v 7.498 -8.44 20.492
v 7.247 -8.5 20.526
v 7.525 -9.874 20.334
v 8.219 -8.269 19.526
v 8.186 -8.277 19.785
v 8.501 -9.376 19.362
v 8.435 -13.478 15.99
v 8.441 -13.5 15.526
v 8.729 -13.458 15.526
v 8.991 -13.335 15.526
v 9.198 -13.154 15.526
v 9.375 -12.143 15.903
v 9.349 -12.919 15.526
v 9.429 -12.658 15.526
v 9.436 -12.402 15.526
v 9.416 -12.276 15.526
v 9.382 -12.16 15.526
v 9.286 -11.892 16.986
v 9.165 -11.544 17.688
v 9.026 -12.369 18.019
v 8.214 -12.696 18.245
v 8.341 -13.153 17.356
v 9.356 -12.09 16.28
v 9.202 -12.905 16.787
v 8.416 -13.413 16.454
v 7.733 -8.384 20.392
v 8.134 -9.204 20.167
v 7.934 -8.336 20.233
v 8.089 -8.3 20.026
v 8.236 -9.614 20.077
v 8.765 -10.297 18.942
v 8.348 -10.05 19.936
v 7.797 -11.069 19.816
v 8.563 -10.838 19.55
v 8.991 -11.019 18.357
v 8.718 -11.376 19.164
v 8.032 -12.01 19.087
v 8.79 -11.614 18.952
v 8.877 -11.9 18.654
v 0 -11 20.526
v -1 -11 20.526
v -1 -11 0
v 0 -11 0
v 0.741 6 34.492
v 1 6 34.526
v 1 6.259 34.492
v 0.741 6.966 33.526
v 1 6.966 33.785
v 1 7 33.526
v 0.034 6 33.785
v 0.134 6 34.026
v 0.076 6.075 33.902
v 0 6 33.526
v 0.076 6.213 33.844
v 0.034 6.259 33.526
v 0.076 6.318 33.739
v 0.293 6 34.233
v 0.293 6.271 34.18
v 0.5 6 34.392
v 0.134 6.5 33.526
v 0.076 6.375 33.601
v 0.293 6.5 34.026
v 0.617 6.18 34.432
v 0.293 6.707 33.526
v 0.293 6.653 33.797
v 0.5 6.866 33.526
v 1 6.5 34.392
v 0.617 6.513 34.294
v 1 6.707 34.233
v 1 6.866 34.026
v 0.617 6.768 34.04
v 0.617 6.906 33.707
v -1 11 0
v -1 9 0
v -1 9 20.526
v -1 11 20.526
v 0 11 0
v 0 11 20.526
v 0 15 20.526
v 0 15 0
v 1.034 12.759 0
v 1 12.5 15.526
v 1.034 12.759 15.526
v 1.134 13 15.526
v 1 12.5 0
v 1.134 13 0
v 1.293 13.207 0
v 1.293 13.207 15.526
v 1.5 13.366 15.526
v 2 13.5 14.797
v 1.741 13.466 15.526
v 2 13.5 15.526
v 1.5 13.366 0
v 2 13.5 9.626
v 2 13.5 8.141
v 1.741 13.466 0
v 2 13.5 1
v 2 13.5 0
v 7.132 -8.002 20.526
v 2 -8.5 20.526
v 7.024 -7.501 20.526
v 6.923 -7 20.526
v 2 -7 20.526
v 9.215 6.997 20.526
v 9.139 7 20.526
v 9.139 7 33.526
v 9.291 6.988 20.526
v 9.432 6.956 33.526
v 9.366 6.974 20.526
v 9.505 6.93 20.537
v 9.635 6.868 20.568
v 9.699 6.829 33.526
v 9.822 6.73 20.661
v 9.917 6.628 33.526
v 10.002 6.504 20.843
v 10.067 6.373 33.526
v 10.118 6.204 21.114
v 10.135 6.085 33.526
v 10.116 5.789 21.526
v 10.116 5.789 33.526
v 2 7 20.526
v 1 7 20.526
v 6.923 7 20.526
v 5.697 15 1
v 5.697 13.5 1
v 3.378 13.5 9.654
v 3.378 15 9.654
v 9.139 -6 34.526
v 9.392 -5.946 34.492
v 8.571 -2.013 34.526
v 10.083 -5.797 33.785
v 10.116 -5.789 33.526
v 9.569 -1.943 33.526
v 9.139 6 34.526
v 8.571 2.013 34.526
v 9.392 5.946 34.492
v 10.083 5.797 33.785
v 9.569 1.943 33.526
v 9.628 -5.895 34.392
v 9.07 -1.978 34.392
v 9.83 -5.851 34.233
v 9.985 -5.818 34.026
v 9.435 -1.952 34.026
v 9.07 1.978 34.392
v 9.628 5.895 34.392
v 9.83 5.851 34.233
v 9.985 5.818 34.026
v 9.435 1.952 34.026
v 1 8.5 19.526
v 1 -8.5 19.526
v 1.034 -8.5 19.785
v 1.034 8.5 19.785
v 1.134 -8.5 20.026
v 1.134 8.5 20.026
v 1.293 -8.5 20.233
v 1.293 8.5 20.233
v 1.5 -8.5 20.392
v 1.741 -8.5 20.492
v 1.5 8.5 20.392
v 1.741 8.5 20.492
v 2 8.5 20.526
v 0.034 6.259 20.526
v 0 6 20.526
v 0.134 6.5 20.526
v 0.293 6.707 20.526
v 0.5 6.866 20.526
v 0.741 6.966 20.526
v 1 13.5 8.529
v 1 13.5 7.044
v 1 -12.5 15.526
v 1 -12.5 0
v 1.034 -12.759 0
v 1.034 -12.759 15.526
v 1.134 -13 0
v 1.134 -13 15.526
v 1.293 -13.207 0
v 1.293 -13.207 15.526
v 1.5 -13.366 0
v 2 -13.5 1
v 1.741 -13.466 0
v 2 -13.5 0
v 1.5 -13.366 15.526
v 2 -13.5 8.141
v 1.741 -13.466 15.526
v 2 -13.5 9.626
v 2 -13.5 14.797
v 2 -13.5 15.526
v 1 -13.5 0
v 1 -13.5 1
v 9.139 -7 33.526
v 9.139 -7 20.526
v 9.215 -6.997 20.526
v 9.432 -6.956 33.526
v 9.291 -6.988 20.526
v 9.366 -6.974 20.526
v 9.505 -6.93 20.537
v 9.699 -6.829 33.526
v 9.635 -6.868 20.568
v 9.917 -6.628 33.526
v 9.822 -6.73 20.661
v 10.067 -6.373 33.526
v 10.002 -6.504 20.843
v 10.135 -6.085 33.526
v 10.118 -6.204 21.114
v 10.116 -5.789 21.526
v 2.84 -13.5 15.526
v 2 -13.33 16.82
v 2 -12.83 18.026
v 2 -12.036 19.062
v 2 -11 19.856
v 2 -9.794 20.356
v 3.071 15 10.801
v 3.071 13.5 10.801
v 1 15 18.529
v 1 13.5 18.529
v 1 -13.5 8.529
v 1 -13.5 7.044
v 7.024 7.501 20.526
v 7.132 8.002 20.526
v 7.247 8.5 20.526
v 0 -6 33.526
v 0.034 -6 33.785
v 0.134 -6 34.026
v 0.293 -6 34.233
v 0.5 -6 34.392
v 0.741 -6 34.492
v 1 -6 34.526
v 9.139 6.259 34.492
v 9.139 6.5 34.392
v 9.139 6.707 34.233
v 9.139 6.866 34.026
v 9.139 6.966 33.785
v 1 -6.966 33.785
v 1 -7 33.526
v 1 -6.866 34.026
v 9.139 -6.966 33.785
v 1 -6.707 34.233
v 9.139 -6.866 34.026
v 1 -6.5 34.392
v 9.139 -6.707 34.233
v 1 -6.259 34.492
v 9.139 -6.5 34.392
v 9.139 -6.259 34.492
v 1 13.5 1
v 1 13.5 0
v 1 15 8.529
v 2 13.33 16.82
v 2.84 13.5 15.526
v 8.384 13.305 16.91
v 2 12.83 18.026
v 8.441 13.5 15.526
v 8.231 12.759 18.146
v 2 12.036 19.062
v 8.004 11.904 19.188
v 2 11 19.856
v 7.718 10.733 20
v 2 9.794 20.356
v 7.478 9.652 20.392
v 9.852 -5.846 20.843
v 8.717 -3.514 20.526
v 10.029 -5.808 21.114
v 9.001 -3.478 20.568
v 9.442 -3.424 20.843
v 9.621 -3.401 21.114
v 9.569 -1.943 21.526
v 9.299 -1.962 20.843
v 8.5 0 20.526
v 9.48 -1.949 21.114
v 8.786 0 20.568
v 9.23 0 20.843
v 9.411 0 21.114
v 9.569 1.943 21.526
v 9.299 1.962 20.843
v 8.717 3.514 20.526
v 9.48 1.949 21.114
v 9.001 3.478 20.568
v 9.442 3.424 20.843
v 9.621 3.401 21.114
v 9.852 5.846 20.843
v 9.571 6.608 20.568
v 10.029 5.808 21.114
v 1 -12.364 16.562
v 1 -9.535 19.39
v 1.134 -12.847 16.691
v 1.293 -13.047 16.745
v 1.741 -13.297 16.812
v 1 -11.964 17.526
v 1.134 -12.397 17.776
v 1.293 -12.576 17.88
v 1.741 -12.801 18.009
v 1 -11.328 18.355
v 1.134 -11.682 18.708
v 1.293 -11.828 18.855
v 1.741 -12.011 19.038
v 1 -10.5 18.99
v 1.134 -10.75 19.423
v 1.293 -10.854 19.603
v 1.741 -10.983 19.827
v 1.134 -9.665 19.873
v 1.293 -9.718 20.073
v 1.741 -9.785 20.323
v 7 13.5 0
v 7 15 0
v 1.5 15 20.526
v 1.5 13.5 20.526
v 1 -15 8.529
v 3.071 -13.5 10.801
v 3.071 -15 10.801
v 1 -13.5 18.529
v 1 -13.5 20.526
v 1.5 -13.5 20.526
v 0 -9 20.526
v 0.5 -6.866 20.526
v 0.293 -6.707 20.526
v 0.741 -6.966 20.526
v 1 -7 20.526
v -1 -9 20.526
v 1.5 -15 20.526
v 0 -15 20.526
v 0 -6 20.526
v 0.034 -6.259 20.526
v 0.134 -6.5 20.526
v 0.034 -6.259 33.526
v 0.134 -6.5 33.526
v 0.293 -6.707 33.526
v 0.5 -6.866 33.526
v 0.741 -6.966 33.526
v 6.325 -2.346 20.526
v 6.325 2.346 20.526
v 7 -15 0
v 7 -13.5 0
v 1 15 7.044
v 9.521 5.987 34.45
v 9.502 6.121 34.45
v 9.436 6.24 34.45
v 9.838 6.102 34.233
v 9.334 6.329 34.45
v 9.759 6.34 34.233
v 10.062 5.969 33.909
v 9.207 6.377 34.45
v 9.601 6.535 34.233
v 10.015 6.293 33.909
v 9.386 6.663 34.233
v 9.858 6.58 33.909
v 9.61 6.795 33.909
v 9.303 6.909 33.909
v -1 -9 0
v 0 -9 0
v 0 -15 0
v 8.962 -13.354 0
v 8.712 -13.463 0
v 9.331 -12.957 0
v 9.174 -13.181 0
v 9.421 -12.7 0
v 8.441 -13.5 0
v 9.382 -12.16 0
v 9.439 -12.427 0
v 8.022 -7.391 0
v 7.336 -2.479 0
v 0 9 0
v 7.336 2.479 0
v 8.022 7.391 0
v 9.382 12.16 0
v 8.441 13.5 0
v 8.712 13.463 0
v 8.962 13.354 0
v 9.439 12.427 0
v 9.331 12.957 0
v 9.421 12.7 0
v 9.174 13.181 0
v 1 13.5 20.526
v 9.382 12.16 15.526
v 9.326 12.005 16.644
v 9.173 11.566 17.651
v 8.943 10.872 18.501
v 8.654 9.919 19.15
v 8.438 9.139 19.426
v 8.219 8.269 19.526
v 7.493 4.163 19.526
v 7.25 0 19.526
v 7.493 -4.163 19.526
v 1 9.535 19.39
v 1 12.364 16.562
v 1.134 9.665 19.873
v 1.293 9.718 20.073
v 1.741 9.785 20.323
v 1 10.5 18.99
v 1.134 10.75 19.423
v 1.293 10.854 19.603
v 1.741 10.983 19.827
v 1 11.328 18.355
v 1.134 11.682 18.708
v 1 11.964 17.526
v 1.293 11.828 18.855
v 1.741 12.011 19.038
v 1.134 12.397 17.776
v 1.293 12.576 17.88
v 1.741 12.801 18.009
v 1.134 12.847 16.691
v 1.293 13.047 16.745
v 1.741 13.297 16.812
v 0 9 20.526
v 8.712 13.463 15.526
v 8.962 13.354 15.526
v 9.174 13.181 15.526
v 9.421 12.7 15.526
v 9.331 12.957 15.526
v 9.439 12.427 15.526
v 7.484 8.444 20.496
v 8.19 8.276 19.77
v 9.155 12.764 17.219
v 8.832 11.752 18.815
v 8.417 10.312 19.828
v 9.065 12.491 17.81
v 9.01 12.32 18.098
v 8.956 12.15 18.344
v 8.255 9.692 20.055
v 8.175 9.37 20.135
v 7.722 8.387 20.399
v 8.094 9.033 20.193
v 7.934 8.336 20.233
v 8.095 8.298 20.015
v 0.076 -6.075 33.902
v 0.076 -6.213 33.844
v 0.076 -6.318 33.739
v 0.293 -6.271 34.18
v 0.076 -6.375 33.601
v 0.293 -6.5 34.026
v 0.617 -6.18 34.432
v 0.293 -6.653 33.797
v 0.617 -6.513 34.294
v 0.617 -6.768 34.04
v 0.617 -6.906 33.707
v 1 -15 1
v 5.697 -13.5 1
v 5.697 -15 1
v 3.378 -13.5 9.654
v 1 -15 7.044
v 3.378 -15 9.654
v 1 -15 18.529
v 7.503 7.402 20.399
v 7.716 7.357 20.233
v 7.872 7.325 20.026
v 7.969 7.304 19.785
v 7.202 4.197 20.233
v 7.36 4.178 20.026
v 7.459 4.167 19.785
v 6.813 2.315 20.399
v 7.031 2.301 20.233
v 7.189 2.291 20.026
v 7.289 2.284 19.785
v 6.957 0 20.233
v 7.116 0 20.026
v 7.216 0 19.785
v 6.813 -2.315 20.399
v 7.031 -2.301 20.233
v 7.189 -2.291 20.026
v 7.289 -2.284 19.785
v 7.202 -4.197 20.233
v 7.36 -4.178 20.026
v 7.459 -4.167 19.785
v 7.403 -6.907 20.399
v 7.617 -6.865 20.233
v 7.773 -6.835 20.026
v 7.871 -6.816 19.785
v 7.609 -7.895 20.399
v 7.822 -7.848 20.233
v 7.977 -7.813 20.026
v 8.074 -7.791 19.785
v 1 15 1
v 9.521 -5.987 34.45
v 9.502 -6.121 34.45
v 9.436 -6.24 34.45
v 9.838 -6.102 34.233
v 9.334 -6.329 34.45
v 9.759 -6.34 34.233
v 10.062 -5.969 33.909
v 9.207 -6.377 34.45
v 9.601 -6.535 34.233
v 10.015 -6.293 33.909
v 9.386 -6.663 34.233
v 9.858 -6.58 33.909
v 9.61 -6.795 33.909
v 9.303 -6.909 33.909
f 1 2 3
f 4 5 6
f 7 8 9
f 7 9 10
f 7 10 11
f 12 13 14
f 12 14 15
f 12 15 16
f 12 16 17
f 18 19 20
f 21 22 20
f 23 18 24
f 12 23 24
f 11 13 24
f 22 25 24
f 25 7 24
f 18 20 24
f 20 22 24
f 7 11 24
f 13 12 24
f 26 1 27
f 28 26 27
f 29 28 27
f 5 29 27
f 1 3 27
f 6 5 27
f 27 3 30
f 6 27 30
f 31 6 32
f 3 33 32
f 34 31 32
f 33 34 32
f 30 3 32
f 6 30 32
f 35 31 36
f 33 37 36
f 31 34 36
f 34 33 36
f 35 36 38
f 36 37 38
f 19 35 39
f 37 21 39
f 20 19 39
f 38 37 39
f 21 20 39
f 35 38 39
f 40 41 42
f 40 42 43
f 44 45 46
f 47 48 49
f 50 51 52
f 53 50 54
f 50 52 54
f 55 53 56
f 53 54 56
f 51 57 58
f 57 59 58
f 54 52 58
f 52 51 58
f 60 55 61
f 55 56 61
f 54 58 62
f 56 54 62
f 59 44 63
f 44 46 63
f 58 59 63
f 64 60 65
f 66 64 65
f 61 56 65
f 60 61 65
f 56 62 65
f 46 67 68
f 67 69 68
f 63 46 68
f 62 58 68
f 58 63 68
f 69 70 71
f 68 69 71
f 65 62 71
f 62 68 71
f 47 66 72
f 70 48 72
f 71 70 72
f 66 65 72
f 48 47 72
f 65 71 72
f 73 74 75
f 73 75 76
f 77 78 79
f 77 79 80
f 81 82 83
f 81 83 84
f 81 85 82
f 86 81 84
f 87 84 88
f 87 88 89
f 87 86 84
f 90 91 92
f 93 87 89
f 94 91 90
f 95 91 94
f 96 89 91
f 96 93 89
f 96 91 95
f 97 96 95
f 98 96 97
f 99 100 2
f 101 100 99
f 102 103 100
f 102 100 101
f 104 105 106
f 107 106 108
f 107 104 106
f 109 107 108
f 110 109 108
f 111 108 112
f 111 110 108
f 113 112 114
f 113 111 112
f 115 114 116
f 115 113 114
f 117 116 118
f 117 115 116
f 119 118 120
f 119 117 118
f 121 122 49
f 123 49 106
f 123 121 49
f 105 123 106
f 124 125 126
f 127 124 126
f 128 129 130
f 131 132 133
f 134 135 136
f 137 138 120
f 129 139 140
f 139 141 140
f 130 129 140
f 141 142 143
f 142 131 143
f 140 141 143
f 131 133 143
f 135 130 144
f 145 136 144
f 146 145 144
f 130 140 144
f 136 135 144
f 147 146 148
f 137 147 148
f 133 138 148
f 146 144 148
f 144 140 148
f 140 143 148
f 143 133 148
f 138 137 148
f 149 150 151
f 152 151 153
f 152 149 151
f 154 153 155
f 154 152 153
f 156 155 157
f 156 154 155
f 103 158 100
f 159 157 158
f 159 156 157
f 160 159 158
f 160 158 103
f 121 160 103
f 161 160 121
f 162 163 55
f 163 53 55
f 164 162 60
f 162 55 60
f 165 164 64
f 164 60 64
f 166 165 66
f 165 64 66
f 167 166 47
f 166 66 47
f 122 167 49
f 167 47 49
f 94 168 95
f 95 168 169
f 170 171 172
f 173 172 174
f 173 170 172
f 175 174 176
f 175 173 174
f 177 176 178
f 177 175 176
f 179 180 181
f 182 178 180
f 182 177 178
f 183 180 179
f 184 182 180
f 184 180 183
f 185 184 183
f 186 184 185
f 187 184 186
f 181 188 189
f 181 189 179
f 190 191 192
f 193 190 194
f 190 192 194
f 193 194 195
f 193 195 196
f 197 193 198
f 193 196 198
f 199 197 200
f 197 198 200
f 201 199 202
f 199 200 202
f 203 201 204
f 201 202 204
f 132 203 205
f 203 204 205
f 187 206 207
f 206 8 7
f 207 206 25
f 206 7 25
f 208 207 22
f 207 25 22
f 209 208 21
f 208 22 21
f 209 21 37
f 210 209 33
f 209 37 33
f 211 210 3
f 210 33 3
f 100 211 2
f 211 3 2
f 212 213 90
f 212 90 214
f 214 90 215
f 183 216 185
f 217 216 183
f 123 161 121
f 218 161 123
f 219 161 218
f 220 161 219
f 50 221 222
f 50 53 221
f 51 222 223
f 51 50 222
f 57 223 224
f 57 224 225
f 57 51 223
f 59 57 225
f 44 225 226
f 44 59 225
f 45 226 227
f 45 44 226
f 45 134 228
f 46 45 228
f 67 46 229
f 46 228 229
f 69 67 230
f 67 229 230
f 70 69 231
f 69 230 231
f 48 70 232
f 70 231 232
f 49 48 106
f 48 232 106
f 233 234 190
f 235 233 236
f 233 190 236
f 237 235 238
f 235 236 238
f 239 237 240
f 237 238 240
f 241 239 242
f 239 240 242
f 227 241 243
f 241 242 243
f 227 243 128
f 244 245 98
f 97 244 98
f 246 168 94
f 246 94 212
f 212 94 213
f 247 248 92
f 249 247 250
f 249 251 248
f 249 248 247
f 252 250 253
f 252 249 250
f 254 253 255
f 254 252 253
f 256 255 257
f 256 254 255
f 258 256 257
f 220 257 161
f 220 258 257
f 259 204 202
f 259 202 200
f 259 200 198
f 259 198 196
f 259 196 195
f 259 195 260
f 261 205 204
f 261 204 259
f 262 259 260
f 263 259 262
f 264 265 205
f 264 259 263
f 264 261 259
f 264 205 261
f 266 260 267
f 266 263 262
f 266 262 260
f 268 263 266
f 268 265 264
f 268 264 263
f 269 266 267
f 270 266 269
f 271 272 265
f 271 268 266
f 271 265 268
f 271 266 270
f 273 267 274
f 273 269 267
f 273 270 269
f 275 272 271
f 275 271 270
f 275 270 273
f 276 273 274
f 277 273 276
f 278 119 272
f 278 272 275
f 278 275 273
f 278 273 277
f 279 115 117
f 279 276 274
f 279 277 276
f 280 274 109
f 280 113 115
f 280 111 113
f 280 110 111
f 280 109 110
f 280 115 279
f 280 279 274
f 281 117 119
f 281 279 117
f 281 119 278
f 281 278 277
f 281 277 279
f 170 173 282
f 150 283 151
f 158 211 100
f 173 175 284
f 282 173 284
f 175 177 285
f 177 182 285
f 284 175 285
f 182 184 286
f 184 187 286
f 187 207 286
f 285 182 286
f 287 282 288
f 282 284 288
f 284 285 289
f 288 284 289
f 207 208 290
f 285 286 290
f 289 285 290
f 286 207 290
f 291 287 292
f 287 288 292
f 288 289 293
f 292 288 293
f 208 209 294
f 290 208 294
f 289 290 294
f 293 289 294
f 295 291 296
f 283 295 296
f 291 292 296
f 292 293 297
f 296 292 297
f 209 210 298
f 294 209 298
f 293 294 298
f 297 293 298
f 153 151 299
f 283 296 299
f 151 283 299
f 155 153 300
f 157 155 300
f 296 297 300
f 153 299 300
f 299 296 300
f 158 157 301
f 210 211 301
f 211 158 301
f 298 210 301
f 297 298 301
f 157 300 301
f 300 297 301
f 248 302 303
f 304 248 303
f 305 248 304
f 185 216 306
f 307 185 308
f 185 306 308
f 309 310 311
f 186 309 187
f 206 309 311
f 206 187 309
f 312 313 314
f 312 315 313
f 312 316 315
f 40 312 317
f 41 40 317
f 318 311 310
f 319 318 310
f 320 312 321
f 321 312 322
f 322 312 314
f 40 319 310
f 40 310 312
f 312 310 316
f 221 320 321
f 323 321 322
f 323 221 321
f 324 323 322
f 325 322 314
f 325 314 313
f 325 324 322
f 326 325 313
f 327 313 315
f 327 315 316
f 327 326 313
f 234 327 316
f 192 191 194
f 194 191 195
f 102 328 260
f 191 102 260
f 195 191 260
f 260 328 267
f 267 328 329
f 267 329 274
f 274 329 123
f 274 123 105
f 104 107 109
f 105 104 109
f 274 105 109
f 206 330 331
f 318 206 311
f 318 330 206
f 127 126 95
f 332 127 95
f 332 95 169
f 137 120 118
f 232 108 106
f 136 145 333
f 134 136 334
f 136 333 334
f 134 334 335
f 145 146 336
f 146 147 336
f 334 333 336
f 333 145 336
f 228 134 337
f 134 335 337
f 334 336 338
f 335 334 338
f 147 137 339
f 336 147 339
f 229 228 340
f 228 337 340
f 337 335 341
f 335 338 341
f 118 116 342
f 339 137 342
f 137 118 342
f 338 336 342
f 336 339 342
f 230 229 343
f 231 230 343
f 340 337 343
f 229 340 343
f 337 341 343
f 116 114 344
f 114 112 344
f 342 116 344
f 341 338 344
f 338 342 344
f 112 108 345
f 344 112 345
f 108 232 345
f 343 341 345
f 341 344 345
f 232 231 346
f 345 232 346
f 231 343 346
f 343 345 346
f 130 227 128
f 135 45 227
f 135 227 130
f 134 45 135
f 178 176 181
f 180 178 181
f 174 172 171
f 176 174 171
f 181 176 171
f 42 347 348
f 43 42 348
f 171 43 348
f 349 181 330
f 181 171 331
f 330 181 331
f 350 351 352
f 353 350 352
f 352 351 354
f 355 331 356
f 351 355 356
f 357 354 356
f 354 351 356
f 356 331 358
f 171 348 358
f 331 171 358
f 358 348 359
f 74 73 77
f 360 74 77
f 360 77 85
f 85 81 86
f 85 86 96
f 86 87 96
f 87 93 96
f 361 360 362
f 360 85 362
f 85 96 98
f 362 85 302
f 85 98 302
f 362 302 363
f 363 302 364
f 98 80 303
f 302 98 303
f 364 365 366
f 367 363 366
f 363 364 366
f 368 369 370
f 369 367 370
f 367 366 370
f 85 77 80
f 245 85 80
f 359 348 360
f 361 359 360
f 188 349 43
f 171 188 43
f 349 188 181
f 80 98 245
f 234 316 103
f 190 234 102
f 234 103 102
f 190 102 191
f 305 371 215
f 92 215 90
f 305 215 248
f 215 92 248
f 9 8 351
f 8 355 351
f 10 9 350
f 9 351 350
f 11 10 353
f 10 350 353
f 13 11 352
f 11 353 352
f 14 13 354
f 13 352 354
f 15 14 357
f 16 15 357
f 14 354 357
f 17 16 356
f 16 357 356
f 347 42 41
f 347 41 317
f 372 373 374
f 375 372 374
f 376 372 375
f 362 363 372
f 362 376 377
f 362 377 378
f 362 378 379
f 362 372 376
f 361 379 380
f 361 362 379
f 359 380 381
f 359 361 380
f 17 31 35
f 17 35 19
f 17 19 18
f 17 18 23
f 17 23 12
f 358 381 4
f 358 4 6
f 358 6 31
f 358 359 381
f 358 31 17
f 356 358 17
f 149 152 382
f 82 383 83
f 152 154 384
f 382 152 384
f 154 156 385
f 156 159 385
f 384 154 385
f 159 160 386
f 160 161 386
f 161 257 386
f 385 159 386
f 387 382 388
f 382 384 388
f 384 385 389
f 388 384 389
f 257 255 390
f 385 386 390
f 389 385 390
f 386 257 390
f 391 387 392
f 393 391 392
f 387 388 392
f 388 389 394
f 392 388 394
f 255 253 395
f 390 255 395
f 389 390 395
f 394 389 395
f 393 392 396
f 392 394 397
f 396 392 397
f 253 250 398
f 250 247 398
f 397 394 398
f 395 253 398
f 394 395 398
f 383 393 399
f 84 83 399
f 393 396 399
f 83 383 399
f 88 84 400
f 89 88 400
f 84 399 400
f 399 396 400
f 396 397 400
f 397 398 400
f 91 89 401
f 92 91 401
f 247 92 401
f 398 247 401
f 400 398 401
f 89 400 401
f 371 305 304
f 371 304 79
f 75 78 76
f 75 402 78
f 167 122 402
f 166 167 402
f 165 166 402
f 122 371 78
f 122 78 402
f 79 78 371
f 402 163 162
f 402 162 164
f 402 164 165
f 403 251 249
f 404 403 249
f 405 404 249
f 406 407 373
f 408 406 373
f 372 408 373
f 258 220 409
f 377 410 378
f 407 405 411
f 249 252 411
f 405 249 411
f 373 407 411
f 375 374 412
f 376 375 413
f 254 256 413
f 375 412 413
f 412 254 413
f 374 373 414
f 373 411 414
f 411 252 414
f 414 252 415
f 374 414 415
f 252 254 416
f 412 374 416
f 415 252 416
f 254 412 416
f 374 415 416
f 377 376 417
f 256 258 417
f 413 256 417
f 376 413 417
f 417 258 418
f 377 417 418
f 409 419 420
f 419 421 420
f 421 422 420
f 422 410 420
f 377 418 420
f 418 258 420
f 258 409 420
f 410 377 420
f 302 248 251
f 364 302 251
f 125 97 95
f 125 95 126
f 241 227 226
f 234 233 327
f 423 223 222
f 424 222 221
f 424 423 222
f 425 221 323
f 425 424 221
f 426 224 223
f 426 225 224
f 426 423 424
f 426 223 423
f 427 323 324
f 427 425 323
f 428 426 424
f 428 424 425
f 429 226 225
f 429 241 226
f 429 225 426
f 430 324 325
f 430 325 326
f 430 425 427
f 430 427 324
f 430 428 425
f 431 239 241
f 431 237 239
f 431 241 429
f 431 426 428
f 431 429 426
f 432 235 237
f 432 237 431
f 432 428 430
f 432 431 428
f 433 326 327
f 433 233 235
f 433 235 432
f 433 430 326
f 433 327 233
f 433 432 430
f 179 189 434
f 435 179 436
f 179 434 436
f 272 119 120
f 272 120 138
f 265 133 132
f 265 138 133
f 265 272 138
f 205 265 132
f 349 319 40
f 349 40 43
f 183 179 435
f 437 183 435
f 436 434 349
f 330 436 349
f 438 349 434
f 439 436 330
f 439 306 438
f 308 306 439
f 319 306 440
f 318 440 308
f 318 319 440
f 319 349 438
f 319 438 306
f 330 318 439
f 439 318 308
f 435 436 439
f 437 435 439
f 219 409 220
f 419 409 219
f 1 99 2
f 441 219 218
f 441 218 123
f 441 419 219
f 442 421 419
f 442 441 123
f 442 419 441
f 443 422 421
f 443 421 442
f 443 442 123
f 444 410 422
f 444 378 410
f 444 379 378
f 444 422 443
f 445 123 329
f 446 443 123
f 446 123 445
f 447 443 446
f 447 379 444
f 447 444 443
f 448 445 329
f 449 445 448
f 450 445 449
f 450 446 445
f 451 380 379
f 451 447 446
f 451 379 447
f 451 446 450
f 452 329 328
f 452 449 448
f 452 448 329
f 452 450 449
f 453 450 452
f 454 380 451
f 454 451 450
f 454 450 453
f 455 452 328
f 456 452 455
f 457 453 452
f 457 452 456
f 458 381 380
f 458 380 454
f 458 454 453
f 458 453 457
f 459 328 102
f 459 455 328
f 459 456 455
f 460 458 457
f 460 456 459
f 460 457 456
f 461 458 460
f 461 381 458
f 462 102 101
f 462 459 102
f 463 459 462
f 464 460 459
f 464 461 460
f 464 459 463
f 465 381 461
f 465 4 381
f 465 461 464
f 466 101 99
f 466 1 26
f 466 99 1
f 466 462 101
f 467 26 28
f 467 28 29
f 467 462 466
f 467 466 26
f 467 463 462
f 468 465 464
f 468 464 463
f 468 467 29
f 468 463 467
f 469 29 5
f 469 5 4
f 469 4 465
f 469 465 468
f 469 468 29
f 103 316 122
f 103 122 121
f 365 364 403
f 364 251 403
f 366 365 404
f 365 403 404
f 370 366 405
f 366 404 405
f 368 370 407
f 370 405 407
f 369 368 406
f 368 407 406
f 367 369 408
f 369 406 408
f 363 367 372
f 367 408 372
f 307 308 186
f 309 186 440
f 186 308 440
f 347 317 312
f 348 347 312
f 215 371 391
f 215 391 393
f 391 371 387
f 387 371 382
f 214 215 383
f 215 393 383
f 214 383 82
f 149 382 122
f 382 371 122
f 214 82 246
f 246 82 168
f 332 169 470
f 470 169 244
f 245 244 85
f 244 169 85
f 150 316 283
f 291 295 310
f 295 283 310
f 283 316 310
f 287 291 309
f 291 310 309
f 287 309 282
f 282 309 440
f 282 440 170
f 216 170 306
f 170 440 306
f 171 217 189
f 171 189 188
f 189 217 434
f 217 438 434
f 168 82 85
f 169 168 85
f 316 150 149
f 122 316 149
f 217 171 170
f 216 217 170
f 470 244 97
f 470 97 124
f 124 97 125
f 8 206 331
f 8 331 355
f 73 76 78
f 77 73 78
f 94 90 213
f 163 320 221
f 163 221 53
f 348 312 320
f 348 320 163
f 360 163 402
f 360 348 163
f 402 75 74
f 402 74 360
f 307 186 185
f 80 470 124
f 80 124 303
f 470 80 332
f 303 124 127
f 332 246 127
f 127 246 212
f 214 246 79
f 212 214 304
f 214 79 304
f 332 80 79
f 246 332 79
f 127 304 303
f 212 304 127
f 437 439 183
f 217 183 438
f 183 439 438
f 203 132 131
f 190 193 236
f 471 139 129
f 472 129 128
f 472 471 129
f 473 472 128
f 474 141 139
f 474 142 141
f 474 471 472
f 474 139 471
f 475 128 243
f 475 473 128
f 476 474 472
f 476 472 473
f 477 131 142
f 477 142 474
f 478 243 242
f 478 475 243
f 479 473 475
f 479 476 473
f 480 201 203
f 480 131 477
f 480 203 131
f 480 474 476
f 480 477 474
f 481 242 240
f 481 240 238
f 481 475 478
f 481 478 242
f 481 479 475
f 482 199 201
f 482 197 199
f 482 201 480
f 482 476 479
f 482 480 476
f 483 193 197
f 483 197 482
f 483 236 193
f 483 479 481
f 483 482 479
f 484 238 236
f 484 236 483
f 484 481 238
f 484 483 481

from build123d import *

# Parameters (mm, degrees)
F1_DEPTH  = 15
F2_W      = 7
F2_H      = 27
F3_DEPTH  = 25
F6_DEPTH  = 20
F8_W      = 1
F8_H      = 2
F9_DEPTH  = 20.5262794416
F10_W     = 9
F10_H     = 27
F11_DEPTH = 20.5262794416
F12_R     = 35.75
F13_DEPTH = 30
F15_R     = 5
F16_R     = 1
F17_W     = 11
F17_H     = 14
F18_DEPTH = 14
F19_R     = 27.5
F20_DEPTH = 60
F22_R     = 1


with BuildPart() as f1:
    # F0 (on Front) → F1 (new body, symmetric)
    with BuildSketch(Plane.XZ):
        Polygon((0, 20.5262794416), (0, 0), (7, 0), (1.5, 20.5262794416), align=None)
    extrude(amount=F1_DEPTH, both=True)


with BuildPart() as f3:
    # F2 (on Top) → F3 (new body)
    with BuildSketch(Plane.XY):
        with Locations((4.5, 0)):
            Rectangle(F2_W, F2_H)
    extrude(amount=F3_DEPTH)


with BuildPart() as f6:
    # F4 (on Front) → F6 (new body, symmetric)
    with BuildSketch(Plane.XZ):
        Polygon((3.0705523608, 10.8011949299), (1, 18.5286015403), (1, 8.5286015403), align=None)
    extrude(amount=F6_DEPTH, both=True)


with BuildPart() as f6b:
    # F5 (on Front) → F6, piece 2 (new body, symmetric)
    with BuildSketch(Plane.XZ):
        Polygon((3.377991262, 9.6538173306), (1, 7.0437856671), (1, 1), (5.6967746272, 1), align=None)
    extrude(amount=F6_DEPTH, both=True)


with BuildPart() as f1_1:
    add(f1.part)

    # F7: cut F6b, F6, F3
    add(f6b.part, mode=Mode.SUBTRACT)
    add(f6.part, mode=Mode.SUBTRACT)
    add(f3.part, mode=Mode.SUBTRACT)

    # F8 (on face) → F9 (join, through all)
    with BuildSketch(Plane.XY.offset(20.5262794416)):
        with Locations((-0.5, -10)):
            Rectangle(F8_W, F8_H)
        with Locations((-0.5, 10)):
            Rectangle(F8_W, F8_H)
    extrude(amount=-F9_DEPTH)



with BuildPart() as f11:
    # F10 (on Top) → F11 (new body, through all)
    with BuildSketch(Plane.XY):
        with Locations((5.5, 0)):
            Rectangle(F10_W, F10_H)
    extrude(amount=F11_DEPTH)


with BuildPart() as f13:
    # F12 (on Top) → F13 (new body)
    with BuildSketch(Plane.XY):
        with Locations((43, 0)):
            Circle(F12_R)
    extrude(amount=F13_DEPTH)


with BuildPart() as f11_1:
    add(f11.part)

    # F14: cut F13
    add(f13.part, mode=Mode.SUBTRACT)

    # F15
    f15_edges = [f11_1.edges().sort_by_distance(p)[0] for p in [
        (5.448471, -13.5, 20.526279),
        (5.448471, 13.5, 20.526279),
    ]]
    fillet(f15_edges, radius=F15_R)

    # F16
    f16_edges = [f11_1.edges().sort_by_distance(p)[0] for p in [
        (9.896941, -13.5, 7.76314),
        (1, -13.5, 7.76314),
    ]]
    fillet(f16_edges, radius=F16_R)


with BuildPart() as f1_2:
    add(f1_1.part)

    add(f11_1.part)  # F18 merges F11
    # F17 (on face) → F18 (join)
    with BuildSketch(Plane.XY.offset(20.5262794416)):
        with Locations((5.5, 0)):
            Rectangle(F17_W, F17_H)
    extrude(amount=F18_DEPTH)


with BuildPart() as f20:
    # F19 (on Top) → F20 (new body)
    with BuildSketch(Plane.XY):
        with Locations((37, 0)):
            Circle(F19_R)
    extrude(amount=F20_DEPTH)


with BuildPart() as f1_3:
    add(f1_2.part)

    # F21: cut F20
    add(f20.part, mode=Mode.SUBTRACT)

    # F22
    f22_edges = [f1_3.edges().sort_by_distance(p)[0] for p in [
        (10.405828, 7, 27.526279),
        (9.5, 0, 20.526279),
        (10.405828, -7, 27.526279),
        (9.5, 0, 34.526279),
        (5.202914, 7, 34.526279),
        (5.202914, -7, 34.526279),
        (0, 0, 34.526279),
        (0, 7, 27.526279),
        (0, -7, 27.526279),
    ]]
    fillet(f22_edges, radius=F22_R)


solid = f1_3.part
